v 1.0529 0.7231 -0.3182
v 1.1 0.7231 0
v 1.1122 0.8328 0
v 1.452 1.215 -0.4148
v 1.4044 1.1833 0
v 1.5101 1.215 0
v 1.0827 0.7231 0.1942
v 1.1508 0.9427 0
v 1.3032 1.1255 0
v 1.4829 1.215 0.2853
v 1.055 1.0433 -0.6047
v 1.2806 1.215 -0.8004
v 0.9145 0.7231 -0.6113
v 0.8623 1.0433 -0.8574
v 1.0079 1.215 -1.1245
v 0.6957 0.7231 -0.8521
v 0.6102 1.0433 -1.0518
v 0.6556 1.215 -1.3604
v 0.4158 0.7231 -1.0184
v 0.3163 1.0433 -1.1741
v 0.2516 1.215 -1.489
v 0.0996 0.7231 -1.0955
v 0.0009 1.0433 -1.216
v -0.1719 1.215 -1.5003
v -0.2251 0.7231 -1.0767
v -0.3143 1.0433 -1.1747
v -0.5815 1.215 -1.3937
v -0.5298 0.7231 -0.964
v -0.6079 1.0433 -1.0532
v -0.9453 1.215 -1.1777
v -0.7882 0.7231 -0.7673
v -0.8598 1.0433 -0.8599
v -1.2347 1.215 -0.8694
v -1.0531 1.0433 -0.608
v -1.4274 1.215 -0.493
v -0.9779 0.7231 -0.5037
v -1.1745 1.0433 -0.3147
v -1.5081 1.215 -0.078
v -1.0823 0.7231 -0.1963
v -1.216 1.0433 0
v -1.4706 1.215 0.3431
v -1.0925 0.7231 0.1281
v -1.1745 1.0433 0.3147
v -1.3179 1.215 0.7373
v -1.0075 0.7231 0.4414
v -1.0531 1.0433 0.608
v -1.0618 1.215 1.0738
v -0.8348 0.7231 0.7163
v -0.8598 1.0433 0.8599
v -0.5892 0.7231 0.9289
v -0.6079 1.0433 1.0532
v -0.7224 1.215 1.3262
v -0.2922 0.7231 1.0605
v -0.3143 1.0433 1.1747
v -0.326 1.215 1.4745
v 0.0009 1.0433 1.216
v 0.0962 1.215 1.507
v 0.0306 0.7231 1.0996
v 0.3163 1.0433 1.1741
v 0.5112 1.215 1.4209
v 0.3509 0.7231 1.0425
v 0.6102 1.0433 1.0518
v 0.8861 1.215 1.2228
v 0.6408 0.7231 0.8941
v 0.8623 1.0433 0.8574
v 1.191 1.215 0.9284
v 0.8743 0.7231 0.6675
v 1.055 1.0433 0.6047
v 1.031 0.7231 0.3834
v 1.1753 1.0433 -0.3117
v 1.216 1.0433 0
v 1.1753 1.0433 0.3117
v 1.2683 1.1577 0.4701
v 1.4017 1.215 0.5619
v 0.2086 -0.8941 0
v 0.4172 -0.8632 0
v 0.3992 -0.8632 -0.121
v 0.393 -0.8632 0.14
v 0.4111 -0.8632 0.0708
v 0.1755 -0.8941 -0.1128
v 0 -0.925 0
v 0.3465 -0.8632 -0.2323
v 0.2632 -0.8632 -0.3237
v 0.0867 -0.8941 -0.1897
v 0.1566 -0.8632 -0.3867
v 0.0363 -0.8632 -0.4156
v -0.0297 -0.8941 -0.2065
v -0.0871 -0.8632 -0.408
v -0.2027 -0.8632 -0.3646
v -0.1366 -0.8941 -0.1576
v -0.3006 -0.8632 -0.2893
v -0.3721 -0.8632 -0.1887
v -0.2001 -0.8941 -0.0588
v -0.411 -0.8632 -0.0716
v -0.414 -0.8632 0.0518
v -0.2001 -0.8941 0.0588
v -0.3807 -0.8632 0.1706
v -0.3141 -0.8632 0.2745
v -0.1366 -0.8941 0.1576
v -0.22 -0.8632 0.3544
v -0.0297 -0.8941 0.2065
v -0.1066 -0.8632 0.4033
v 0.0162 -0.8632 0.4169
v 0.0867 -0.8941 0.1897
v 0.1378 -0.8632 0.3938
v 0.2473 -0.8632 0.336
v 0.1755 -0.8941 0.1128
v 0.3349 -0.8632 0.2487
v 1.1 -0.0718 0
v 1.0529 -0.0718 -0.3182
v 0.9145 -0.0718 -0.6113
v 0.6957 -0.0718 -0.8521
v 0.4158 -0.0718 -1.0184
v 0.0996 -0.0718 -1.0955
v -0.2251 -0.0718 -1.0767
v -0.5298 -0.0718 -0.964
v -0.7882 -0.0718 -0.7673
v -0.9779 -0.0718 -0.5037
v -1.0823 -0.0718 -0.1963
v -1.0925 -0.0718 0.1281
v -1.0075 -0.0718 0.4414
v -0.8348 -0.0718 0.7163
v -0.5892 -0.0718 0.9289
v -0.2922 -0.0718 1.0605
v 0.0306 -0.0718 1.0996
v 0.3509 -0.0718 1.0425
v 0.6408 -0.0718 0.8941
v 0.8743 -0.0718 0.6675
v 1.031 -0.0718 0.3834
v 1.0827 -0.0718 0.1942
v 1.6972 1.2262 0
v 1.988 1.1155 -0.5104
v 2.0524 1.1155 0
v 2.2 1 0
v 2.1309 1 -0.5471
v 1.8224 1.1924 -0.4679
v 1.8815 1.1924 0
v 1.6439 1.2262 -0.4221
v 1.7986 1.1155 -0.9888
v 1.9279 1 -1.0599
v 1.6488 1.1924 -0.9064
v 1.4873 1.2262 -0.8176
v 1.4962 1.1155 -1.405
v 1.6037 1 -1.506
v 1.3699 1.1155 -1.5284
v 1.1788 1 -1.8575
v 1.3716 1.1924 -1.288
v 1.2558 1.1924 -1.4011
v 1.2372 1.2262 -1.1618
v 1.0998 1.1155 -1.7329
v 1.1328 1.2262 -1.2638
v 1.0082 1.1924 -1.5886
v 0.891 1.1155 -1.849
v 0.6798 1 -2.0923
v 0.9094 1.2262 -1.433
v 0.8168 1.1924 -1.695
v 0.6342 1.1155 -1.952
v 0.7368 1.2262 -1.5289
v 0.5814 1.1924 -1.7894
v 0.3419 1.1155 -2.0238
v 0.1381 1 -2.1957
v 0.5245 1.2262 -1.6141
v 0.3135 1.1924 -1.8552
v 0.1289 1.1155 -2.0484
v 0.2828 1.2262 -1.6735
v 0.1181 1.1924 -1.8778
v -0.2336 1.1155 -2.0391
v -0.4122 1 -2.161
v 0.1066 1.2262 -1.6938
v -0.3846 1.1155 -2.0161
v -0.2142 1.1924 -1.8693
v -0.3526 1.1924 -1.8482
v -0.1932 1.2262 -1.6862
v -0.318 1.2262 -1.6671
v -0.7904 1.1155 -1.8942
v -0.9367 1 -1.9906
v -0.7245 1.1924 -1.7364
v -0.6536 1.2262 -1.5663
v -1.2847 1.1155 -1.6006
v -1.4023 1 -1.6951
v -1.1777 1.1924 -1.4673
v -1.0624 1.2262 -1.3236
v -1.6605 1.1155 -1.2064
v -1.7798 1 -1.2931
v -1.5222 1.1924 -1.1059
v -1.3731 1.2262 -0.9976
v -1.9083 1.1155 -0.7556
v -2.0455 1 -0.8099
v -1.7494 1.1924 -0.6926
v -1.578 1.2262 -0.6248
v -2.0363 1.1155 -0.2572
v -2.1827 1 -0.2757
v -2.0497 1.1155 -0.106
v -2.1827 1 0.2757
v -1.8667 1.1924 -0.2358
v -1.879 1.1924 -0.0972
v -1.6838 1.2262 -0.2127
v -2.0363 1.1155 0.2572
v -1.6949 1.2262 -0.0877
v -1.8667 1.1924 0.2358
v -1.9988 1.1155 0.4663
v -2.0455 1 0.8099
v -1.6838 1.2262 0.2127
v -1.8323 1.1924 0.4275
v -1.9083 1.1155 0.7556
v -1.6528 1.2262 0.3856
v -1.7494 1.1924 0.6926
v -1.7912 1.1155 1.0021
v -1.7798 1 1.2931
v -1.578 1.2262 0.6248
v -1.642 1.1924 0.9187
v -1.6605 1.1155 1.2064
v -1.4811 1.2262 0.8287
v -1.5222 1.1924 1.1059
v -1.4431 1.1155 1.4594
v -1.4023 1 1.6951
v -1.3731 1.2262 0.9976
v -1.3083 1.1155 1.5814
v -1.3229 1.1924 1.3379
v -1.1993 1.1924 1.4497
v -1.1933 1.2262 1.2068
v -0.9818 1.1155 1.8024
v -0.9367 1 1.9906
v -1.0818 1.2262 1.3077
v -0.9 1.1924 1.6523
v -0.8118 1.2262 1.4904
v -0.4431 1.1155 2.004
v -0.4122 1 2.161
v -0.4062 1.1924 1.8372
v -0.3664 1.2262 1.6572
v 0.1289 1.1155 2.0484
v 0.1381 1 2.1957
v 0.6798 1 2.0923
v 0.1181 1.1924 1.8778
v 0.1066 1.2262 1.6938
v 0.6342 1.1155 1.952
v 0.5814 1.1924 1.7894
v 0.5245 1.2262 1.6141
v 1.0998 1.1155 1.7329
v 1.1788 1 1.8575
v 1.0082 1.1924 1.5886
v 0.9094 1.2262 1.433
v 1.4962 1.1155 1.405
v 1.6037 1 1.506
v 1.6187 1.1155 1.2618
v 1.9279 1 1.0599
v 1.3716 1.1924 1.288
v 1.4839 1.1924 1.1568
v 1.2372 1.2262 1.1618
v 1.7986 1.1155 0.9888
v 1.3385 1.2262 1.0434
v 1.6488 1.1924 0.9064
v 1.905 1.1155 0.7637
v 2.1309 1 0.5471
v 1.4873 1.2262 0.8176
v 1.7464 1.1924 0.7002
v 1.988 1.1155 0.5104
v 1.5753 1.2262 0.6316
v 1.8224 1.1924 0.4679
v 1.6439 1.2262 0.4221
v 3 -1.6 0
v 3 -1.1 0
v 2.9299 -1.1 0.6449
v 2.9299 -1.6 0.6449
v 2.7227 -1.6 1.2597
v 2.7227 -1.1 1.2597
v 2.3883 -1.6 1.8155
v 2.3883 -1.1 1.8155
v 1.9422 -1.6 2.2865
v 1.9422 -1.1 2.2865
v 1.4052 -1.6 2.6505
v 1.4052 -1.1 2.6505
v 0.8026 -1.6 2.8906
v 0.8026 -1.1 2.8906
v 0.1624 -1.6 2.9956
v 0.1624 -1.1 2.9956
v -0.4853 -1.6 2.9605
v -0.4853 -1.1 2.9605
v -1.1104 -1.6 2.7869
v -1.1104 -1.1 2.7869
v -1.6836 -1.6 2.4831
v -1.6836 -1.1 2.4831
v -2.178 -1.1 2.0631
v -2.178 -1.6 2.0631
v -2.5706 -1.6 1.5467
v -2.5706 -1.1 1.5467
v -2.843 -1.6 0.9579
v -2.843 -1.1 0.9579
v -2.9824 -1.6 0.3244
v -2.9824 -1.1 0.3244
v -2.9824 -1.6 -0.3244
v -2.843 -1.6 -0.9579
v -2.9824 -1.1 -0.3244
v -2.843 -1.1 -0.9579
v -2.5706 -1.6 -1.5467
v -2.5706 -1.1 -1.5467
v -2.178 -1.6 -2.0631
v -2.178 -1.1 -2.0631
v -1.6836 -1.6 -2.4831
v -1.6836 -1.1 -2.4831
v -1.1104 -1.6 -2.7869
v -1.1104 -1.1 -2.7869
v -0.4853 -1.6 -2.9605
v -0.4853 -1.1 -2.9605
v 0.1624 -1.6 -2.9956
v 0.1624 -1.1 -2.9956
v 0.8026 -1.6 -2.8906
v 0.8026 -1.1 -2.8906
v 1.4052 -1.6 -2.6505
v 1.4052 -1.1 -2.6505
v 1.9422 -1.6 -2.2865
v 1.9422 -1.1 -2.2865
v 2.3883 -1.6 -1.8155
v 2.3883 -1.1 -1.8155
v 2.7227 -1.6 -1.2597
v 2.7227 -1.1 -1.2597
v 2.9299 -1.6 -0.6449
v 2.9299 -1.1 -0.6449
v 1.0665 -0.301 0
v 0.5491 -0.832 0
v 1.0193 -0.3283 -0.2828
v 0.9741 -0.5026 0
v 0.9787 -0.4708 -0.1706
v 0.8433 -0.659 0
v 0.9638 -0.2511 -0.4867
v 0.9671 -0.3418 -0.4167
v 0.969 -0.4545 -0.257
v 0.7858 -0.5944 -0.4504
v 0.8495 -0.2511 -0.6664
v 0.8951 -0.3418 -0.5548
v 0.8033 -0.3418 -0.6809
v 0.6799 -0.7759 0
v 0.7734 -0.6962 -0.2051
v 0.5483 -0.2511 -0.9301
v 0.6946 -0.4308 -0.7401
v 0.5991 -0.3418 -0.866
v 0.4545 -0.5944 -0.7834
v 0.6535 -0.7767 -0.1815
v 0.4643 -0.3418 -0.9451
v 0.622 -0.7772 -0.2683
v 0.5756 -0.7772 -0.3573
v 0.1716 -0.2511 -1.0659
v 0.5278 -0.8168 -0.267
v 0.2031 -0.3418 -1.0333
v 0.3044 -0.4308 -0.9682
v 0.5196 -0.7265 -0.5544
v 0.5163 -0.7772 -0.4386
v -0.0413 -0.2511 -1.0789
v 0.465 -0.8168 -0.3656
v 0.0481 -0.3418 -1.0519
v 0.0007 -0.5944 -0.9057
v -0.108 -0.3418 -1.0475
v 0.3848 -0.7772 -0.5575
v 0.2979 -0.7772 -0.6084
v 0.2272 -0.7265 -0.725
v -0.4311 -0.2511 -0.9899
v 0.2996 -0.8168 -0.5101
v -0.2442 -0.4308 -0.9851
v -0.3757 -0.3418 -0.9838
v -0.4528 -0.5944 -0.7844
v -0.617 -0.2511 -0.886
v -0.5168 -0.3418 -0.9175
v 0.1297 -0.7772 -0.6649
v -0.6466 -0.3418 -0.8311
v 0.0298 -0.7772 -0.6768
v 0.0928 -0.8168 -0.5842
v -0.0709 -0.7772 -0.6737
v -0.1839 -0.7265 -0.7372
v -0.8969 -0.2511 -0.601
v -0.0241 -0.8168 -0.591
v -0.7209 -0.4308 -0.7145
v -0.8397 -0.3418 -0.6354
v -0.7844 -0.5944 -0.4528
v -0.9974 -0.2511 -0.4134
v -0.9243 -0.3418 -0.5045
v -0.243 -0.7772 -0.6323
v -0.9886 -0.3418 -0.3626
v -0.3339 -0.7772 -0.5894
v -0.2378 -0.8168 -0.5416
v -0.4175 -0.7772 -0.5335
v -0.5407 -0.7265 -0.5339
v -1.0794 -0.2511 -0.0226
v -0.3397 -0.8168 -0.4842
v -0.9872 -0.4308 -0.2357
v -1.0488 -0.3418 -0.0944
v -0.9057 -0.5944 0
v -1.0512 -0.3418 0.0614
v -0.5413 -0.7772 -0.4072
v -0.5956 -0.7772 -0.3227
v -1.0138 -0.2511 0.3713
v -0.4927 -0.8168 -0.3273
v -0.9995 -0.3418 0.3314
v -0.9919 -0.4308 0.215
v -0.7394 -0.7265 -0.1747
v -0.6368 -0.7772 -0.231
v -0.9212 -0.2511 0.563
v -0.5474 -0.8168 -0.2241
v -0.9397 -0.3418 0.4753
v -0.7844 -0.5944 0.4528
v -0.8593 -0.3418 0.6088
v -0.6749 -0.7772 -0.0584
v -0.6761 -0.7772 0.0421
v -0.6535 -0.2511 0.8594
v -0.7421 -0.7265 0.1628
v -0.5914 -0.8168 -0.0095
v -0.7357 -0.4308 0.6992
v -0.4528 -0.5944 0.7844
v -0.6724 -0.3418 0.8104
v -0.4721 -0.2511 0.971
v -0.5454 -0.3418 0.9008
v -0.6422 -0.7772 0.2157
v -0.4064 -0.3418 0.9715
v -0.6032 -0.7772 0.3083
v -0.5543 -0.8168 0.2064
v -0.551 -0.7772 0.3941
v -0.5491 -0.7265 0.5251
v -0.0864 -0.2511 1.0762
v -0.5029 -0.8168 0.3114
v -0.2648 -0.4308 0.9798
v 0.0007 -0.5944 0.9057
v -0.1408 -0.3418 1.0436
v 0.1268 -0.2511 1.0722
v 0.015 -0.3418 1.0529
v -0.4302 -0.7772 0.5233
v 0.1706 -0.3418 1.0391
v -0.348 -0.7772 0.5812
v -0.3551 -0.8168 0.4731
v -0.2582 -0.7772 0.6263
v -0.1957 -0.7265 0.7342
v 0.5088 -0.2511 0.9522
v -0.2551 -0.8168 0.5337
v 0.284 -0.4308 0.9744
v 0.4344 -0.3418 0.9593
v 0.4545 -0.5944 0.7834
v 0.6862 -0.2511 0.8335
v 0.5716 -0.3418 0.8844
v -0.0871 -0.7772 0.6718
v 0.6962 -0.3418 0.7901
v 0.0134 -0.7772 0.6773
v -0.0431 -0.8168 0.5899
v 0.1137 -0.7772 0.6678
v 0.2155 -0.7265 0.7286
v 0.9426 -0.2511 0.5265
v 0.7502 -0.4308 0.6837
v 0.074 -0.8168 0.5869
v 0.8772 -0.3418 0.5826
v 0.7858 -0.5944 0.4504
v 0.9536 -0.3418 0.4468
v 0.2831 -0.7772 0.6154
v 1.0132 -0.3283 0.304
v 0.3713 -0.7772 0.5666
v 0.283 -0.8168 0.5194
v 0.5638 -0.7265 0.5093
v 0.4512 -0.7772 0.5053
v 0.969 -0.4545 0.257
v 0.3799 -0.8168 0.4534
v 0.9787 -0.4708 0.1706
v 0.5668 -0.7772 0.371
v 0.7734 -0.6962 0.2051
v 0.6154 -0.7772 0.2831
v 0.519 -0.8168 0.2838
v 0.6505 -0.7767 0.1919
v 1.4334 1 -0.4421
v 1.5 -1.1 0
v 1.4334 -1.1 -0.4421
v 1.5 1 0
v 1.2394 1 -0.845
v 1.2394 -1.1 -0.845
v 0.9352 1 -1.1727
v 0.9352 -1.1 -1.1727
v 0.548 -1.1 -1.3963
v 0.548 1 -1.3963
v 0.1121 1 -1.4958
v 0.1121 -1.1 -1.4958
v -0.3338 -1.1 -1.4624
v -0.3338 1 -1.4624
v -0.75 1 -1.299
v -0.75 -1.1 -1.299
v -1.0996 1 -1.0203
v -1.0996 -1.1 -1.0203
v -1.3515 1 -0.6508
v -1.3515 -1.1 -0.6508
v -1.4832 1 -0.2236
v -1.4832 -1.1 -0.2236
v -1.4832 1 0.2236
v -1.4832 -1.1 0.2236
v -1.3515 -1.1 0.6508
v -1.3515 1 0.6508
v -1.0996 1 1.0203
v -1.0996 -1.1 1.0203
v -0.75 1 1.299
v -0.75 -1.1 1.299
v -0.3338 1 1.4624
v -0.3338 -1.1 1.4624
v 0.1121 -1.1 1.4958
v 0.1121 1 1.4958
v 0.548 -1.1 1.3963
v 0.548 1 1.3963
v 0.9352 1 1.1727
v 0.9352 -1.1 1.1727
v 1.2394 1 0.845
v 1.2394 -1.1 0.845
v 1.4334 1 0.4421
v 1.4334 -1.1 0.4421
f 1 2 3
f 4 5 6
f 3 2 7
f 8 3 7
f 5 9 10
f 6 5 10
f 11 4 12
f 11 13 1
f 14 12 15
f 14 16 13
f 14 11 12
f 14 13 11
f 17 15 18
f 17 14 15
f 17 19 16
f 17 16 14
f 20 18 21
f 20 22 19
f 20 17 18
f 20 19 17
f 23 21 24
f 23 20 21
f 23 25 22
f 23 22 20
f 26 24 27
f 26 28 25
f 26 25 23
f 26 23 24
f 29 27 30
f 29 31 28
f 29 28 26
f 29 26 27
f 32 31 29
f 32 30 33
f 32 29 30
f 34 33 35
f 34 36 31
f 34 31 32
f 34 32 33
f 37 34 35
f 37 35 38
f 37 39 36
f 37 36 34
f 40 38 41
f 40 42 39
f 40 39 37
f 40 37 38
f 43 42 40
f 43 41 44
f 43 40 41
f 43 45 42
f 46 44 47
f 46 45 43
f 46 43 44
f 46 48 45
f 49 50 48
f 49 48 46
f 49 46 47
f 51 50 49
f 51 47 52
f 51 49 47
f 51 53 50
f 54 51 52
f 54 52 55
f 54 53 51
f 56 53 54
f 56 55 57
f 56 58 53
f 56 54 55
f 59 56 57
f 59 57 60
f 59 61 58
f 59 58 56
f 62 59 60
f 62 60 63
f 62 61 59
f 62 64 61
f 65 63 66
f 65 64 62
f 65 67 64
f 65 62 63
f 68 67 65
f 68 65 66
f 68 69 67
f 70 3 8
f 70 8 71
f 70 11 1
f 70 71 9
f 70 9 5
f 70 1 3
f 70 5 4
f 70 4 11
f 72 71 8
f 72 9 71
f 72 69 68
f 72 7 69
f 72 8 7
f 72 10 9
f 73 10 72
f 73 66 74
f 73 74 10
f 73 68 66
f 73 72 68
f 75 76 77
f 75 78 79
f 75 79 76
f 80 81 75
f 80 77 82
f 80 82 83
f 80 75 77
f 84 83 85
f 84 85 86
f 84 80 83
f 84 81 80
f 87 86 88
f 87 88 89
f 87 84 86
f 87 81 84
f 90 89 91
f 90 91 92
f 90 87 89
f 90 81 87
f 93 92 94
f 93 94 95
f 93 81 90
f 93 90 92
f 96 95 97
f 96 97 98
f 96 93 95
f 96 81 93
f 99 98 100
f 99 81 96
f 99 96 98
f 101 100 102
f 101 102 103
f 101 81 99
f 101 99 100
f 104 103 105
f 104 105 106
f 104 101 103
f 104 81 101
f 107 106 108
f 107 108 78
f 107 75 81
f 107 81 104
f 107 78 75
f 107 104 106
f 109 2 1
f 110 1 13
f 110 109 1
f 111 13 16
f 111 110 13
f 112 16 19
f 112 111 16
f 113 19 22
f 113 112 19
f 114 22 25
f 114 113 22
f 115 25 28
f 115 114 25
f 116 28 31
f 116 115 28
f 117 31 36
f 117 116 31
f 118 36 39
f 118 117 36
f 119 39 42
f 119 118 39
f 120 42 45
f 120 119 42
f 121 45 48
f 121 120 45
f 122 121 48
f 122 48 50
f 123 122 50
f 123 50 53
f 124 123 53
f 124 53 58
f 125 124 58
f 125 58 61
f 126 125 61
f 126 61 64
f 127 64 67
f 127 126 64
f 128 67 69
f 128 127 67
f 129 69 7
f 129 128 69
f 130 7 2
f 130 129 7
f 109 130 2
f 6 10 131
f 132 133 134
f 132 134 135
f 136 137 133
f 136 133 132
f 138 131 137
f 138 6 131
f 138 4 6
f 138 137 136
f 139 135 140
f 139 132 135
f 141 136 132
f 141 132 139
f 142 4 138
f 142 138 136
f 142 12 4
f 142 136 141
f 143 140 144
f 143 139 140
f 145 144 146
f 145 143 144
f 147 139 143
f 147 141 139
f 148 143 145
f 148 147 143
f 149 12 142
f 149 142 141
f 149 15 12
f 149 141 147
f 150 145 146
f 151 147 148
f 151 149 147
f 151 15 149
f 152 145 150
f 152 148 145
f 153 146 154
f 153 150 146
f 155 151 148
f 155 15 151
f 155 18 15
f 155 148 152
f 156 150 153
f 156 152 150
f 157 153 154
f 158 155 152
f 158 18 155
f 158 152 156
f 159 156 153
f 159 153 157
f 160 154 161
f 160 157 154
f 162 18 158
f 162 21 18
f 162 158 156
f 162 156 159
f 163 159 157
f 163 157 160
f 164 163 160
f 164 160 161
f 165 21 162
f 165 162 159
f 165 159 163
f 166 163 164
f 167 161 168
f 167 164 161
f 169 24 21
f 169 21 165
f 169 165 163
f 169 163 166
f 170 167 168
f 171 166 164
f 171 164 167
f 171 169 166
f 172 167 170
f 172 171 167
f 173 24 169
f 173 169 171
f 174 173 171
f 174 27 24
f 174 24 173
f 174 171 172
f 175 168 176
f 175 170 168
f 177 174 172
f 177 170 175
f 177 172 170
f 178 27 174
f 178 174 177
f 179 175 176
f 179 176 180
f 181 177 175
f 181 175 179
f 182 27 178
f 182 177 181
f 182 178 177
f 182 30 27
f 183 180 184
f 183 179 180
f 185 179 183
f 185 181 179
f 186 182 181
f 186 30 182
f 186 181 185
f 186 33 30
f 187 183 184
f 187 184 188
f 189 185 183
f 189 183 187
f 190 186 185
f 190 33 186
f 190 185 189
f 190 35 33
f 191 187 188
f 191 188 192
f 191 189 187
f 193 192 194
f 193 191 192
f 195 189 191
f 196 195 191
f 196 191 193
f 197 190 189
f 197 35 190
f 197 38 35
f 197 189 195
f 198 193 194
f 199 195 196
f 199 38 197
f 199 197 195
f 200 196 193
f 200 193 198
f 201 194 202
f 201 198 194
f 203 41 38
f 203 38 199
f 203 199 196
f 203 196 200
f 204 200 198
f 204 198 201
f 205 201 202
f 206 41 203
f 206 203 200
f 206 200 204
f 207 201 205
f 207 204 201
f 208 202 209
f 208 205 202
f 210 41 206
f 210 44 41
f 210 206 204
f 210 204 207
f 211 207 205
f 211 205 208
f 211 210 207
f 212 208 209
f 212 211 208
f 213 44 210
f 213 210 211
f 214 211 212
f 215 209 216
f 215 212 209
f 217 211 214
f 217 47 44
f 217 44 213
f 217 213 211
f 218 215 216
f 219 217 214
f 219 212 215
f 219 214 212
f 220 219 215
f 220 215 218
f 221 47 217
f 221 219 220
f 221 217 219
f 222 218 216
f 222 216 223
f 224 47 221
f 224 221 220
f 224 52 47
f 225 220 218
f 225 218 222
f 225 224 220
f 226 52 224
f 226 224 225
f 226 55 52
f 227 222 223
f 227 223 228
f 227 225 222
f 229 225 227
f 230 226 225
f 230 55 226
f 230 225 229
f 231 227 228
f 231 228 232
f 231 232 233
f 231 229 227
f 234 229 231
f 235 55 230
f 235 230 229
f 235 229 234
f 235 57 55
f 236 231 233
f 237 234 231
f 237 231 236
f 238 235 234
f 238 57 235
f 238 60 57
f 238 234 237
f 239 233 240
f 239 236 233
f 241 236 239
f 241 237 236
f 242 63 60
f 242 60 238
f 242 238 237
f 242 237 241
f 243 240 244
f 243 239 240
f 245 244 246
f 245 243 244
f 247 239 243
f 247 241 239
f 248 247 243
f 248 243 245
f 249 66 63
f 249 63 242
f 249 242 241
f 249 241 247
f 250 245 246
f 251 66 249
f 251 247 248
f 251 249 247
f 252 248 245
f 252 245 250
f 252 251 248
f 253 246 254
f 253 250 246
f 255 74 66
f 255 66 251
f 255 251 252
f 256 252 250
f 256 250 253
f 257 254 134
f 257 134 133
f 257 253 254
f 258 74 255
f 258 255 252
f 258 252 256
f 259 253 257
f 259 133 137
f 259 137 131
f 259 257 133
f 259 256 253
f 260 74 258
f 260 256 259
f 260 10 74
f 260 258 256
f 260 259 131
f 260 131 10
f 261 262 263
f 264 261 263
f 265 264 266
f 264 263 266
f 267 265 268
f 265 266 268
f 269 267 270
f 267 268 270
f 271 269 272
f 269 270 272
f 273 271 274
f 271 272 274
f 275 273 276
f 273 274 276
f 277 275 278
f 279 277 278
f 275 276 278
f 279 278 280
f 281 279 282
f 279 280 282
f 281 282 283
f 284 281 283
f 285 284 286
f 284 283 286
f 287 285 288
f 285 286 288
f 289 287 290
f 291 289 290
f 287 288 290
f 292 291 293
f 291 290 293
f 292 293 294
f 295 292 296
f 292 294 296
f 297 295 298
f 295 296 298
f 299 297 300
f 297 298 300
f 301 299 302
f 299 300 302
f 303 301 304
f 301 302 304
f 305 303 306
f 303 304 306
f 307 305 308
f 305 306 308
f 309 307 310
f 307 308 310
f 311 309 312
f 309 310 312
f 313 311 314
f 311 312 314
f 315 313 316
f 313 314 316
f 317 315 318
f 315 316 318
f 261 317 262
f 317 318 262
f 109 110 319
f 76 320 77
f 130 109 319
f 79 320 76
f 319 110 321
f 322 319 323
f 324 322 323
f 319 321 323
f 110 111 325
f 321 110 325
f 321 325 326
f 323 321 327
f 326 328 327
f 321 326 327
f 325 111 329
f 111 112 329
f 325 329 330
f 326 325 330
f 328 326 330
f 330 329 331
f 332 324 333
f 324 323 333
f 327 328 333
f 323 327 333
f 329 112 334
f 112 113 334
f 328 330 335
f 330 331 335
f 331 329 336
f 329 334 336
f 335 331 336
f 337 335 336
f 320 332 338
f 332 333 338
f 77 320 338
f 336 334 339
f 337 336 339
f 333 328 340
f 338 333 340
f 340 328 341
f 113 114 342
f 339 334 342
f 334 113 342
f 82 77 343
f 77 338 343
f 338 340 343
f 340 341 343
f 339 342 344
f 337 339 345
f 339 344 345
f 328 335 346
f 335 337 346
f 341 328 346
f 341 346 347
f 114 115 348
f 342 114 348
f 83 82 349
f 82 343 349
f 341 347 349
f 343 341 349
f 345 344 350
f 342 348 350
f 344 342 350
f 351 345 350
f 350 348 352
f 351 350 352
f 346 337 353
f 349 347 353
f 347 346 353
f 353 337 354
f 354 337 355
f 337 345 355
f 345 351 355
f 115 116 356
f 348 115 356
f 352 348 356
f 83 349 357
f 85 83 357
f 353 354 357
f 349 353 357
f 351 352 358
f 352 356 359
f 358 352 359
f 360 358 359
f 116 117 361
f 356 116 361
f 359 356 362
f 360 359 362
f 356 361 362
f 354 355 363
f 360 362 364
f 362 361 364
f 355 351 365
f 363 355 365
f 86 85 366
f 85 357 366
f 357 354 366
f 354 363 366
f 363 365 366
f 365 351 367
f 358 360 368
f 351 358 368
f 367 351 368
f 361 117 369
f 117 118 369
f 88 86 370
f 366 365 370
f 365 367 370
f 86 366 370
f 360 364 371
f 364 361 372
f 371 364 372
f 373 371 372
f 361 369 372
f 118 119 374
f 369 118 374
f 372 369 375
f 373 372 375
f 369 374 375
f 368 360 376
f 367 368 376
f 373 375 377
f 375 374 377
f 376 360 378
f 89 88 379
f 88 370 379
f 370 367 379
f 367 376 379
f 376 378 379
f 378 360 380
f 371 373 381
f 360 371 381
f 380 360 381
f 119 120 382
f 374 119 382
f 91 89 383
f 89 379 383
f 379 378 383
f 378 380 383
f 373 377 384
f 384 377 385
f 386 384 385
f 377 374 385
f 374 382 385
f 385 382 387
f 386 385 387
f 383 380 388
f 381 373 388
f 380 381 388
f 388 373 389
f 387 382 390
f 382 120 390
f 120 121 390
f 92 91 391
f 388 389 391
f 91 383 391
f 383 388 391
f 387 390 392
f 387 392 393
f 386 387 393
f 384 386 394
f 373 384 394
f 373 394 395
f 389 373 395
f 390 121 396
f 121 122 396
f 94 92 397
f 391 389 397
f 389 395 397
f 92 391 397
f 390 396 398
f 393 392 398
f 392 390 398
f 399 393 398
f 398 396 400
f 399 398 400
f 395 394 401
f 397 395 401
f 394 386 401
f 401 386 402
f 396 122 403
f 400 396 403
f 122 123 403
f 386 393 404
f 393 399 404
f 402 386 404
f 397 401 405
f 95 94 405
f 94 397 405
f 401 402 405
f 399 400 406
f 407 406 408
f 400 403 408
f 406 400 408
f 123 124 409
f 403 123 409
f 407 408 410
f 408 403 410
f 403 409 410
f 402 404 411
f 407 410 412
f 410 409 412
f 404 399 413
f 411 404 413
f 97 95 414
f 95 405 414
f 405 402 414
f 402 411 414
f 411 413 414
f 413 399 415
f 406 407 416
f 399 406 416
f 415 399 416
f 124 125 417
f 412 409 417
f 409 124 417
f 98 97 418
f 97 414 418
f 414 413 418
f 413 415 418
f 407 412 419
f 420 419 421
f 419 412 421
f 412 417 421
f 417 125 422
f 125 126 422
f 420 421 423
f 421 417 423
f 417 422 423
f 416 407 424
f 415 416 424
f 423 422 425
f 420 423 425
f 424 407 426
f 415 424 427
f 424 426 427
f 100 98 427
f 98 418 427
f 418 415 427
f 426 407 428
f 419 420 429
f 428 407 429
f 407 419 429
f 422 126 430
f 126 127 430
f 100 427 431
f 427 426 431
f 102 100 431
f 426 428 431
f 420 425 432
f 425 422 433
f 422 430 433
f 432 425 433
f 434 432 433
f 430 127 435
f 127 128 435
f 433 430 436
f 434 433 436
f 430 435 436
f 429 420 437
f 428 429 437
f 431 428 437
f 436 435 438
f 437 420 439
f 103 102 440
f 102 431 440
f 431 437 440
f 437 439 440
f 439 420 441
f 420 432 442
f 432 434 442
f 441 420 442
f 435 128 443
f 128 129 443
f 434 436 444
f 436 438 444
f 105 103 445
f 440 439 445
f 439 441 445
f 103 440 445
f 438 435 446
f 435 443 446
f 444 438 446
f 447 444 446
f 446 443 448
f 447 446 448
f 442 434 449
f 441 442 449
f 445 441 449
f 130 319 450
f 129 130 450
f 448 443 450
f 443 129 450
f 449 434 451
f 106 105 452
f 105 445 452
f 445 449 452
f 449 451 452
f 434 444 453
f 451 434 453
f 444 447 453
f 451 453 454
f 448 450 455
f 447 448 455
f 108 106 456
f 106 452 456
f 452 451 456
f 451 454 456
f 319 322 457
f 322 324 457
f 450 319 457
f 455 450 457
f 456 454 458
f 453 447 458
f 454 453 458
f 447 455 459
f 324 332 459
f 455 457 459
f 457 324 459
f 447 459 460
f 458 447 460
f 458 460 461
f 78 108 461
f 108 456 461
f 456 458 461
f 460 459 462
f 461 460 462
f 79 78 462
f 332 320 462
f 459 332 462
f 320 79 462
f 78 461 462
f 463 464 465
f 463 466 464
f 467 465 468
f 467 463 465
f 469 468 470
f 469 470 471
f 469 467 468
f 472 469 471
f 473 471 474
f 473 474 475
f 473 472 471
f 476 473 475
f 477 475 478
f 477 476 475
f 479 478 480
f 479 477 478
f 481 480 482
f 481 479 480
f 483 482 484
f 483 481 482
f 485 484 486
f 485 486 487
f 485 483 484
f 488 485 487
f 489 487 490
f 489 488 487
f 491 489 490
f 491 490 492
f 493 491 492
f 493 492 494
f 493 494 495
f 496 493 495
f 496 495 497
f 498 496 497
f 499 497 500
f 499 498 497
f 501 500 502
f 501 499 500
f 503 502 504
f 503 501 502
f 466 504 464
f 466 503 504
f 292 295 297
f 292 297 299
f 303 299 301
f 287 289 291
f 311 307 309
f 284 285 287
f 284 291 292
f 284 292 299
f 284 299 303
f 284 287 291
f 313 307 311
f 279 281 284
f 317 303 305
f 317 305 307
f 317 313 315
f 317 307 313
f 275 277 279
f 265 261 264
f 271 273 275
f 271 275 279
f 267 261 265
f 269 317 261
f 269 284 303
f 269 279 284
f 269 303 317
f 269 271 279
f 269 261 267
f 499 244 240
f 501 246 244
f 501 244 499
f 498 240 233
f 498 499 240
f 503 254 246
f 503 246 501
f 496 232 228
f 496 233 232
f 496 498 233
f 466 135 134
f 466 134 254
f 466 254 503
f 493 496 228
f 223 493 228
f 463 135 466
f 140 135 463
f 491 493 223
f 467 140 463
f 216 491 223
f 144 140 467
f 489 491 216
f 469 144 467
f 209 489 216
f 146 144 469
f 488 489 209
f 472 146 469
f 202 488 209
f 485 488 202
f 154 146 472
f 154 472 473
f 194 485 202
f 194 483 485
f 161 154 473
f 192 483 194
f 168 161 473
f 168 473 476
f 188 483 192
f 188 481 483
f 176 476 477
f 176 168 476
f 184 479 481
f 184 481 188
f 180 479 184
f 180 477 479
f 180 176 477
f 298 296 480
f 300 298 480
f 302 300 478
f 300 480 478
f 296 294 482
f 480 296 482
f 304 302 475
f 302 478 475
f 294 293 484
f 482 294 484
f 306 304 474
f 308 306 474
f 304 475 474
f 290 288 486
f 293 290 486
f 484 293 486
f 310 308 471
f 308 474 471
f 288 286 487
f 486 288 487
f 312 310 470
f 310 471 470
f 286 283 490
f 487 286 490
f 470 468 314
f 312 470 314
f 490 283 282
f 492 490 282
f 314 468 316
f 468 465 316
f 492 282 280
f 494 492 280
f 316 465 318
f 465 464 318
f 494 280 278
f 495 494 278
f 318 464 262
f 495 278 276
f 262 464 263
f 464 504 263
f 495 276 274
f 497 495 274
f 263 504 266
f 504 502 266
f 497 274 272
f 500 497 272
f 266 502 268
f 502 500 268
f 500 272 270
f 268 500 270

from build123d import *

# Parameters (mm, degrees)
FILLET1_R           = 0.8
FILLET2_R           = 0.5
SKETCH2_R           = 3
BOSS_EXTRUDE1_DEPTH = 0.5


with BuildPart() as part:
    # Sketch1 → Revolve1 (revolve)
    with BuildSketch(Plane.XY, mode=Mode.PRIVATE) as revolve1_sk:
        with BuildLine():
            Line((-1.5, 1), (-2.2, 1))
            ThreePointArc((-2.2, 1), (-1.65, 1.227674865), (-1.1, 1))
            Line((-1.1, 1), (-1.1, -0.762073649))
            Line((-1.1, -0.762073649), (0, -0.924951874))
            Line((0, -0.924951874), (0, -1.1))
            Line((0, -1.1), (-1.5, -1.1))
            Line((-1.5, -1.1), (-1.5, 1))
        make_face()
    revolve(revolve1_sk.sketch.rotate(Axis((0, -1.1, 0), (0, 1, 0)), 180), axis=Axis((0, -1.1, 0), (0, 1, 0)))

    # Fillet1
    fillet1_edges = [part.edges().sort_by_distance(p)[0] for p in [
        (-1.1, -0.762073649, 0),
    ]]
    fillet(fillet1_edges, radius=FILLET1_R)

    # Fillet2
    fillet2_edges = [part.edges().sort_by_distance(p)[0] for p in [
        (-1.1, 1, 0),
    ]]
    fillet(fillet2_edges, radius=FILLET2_R)

    # Sketch2 → Boss-Extrude1 (add)
    with BuildSketch(Plane.XZ.offset(1.1)):
        Circle(SKETCH2_R)
    extrude(amount=BOSS_EXTRUDE1_DEPTH)


solid = part.part
